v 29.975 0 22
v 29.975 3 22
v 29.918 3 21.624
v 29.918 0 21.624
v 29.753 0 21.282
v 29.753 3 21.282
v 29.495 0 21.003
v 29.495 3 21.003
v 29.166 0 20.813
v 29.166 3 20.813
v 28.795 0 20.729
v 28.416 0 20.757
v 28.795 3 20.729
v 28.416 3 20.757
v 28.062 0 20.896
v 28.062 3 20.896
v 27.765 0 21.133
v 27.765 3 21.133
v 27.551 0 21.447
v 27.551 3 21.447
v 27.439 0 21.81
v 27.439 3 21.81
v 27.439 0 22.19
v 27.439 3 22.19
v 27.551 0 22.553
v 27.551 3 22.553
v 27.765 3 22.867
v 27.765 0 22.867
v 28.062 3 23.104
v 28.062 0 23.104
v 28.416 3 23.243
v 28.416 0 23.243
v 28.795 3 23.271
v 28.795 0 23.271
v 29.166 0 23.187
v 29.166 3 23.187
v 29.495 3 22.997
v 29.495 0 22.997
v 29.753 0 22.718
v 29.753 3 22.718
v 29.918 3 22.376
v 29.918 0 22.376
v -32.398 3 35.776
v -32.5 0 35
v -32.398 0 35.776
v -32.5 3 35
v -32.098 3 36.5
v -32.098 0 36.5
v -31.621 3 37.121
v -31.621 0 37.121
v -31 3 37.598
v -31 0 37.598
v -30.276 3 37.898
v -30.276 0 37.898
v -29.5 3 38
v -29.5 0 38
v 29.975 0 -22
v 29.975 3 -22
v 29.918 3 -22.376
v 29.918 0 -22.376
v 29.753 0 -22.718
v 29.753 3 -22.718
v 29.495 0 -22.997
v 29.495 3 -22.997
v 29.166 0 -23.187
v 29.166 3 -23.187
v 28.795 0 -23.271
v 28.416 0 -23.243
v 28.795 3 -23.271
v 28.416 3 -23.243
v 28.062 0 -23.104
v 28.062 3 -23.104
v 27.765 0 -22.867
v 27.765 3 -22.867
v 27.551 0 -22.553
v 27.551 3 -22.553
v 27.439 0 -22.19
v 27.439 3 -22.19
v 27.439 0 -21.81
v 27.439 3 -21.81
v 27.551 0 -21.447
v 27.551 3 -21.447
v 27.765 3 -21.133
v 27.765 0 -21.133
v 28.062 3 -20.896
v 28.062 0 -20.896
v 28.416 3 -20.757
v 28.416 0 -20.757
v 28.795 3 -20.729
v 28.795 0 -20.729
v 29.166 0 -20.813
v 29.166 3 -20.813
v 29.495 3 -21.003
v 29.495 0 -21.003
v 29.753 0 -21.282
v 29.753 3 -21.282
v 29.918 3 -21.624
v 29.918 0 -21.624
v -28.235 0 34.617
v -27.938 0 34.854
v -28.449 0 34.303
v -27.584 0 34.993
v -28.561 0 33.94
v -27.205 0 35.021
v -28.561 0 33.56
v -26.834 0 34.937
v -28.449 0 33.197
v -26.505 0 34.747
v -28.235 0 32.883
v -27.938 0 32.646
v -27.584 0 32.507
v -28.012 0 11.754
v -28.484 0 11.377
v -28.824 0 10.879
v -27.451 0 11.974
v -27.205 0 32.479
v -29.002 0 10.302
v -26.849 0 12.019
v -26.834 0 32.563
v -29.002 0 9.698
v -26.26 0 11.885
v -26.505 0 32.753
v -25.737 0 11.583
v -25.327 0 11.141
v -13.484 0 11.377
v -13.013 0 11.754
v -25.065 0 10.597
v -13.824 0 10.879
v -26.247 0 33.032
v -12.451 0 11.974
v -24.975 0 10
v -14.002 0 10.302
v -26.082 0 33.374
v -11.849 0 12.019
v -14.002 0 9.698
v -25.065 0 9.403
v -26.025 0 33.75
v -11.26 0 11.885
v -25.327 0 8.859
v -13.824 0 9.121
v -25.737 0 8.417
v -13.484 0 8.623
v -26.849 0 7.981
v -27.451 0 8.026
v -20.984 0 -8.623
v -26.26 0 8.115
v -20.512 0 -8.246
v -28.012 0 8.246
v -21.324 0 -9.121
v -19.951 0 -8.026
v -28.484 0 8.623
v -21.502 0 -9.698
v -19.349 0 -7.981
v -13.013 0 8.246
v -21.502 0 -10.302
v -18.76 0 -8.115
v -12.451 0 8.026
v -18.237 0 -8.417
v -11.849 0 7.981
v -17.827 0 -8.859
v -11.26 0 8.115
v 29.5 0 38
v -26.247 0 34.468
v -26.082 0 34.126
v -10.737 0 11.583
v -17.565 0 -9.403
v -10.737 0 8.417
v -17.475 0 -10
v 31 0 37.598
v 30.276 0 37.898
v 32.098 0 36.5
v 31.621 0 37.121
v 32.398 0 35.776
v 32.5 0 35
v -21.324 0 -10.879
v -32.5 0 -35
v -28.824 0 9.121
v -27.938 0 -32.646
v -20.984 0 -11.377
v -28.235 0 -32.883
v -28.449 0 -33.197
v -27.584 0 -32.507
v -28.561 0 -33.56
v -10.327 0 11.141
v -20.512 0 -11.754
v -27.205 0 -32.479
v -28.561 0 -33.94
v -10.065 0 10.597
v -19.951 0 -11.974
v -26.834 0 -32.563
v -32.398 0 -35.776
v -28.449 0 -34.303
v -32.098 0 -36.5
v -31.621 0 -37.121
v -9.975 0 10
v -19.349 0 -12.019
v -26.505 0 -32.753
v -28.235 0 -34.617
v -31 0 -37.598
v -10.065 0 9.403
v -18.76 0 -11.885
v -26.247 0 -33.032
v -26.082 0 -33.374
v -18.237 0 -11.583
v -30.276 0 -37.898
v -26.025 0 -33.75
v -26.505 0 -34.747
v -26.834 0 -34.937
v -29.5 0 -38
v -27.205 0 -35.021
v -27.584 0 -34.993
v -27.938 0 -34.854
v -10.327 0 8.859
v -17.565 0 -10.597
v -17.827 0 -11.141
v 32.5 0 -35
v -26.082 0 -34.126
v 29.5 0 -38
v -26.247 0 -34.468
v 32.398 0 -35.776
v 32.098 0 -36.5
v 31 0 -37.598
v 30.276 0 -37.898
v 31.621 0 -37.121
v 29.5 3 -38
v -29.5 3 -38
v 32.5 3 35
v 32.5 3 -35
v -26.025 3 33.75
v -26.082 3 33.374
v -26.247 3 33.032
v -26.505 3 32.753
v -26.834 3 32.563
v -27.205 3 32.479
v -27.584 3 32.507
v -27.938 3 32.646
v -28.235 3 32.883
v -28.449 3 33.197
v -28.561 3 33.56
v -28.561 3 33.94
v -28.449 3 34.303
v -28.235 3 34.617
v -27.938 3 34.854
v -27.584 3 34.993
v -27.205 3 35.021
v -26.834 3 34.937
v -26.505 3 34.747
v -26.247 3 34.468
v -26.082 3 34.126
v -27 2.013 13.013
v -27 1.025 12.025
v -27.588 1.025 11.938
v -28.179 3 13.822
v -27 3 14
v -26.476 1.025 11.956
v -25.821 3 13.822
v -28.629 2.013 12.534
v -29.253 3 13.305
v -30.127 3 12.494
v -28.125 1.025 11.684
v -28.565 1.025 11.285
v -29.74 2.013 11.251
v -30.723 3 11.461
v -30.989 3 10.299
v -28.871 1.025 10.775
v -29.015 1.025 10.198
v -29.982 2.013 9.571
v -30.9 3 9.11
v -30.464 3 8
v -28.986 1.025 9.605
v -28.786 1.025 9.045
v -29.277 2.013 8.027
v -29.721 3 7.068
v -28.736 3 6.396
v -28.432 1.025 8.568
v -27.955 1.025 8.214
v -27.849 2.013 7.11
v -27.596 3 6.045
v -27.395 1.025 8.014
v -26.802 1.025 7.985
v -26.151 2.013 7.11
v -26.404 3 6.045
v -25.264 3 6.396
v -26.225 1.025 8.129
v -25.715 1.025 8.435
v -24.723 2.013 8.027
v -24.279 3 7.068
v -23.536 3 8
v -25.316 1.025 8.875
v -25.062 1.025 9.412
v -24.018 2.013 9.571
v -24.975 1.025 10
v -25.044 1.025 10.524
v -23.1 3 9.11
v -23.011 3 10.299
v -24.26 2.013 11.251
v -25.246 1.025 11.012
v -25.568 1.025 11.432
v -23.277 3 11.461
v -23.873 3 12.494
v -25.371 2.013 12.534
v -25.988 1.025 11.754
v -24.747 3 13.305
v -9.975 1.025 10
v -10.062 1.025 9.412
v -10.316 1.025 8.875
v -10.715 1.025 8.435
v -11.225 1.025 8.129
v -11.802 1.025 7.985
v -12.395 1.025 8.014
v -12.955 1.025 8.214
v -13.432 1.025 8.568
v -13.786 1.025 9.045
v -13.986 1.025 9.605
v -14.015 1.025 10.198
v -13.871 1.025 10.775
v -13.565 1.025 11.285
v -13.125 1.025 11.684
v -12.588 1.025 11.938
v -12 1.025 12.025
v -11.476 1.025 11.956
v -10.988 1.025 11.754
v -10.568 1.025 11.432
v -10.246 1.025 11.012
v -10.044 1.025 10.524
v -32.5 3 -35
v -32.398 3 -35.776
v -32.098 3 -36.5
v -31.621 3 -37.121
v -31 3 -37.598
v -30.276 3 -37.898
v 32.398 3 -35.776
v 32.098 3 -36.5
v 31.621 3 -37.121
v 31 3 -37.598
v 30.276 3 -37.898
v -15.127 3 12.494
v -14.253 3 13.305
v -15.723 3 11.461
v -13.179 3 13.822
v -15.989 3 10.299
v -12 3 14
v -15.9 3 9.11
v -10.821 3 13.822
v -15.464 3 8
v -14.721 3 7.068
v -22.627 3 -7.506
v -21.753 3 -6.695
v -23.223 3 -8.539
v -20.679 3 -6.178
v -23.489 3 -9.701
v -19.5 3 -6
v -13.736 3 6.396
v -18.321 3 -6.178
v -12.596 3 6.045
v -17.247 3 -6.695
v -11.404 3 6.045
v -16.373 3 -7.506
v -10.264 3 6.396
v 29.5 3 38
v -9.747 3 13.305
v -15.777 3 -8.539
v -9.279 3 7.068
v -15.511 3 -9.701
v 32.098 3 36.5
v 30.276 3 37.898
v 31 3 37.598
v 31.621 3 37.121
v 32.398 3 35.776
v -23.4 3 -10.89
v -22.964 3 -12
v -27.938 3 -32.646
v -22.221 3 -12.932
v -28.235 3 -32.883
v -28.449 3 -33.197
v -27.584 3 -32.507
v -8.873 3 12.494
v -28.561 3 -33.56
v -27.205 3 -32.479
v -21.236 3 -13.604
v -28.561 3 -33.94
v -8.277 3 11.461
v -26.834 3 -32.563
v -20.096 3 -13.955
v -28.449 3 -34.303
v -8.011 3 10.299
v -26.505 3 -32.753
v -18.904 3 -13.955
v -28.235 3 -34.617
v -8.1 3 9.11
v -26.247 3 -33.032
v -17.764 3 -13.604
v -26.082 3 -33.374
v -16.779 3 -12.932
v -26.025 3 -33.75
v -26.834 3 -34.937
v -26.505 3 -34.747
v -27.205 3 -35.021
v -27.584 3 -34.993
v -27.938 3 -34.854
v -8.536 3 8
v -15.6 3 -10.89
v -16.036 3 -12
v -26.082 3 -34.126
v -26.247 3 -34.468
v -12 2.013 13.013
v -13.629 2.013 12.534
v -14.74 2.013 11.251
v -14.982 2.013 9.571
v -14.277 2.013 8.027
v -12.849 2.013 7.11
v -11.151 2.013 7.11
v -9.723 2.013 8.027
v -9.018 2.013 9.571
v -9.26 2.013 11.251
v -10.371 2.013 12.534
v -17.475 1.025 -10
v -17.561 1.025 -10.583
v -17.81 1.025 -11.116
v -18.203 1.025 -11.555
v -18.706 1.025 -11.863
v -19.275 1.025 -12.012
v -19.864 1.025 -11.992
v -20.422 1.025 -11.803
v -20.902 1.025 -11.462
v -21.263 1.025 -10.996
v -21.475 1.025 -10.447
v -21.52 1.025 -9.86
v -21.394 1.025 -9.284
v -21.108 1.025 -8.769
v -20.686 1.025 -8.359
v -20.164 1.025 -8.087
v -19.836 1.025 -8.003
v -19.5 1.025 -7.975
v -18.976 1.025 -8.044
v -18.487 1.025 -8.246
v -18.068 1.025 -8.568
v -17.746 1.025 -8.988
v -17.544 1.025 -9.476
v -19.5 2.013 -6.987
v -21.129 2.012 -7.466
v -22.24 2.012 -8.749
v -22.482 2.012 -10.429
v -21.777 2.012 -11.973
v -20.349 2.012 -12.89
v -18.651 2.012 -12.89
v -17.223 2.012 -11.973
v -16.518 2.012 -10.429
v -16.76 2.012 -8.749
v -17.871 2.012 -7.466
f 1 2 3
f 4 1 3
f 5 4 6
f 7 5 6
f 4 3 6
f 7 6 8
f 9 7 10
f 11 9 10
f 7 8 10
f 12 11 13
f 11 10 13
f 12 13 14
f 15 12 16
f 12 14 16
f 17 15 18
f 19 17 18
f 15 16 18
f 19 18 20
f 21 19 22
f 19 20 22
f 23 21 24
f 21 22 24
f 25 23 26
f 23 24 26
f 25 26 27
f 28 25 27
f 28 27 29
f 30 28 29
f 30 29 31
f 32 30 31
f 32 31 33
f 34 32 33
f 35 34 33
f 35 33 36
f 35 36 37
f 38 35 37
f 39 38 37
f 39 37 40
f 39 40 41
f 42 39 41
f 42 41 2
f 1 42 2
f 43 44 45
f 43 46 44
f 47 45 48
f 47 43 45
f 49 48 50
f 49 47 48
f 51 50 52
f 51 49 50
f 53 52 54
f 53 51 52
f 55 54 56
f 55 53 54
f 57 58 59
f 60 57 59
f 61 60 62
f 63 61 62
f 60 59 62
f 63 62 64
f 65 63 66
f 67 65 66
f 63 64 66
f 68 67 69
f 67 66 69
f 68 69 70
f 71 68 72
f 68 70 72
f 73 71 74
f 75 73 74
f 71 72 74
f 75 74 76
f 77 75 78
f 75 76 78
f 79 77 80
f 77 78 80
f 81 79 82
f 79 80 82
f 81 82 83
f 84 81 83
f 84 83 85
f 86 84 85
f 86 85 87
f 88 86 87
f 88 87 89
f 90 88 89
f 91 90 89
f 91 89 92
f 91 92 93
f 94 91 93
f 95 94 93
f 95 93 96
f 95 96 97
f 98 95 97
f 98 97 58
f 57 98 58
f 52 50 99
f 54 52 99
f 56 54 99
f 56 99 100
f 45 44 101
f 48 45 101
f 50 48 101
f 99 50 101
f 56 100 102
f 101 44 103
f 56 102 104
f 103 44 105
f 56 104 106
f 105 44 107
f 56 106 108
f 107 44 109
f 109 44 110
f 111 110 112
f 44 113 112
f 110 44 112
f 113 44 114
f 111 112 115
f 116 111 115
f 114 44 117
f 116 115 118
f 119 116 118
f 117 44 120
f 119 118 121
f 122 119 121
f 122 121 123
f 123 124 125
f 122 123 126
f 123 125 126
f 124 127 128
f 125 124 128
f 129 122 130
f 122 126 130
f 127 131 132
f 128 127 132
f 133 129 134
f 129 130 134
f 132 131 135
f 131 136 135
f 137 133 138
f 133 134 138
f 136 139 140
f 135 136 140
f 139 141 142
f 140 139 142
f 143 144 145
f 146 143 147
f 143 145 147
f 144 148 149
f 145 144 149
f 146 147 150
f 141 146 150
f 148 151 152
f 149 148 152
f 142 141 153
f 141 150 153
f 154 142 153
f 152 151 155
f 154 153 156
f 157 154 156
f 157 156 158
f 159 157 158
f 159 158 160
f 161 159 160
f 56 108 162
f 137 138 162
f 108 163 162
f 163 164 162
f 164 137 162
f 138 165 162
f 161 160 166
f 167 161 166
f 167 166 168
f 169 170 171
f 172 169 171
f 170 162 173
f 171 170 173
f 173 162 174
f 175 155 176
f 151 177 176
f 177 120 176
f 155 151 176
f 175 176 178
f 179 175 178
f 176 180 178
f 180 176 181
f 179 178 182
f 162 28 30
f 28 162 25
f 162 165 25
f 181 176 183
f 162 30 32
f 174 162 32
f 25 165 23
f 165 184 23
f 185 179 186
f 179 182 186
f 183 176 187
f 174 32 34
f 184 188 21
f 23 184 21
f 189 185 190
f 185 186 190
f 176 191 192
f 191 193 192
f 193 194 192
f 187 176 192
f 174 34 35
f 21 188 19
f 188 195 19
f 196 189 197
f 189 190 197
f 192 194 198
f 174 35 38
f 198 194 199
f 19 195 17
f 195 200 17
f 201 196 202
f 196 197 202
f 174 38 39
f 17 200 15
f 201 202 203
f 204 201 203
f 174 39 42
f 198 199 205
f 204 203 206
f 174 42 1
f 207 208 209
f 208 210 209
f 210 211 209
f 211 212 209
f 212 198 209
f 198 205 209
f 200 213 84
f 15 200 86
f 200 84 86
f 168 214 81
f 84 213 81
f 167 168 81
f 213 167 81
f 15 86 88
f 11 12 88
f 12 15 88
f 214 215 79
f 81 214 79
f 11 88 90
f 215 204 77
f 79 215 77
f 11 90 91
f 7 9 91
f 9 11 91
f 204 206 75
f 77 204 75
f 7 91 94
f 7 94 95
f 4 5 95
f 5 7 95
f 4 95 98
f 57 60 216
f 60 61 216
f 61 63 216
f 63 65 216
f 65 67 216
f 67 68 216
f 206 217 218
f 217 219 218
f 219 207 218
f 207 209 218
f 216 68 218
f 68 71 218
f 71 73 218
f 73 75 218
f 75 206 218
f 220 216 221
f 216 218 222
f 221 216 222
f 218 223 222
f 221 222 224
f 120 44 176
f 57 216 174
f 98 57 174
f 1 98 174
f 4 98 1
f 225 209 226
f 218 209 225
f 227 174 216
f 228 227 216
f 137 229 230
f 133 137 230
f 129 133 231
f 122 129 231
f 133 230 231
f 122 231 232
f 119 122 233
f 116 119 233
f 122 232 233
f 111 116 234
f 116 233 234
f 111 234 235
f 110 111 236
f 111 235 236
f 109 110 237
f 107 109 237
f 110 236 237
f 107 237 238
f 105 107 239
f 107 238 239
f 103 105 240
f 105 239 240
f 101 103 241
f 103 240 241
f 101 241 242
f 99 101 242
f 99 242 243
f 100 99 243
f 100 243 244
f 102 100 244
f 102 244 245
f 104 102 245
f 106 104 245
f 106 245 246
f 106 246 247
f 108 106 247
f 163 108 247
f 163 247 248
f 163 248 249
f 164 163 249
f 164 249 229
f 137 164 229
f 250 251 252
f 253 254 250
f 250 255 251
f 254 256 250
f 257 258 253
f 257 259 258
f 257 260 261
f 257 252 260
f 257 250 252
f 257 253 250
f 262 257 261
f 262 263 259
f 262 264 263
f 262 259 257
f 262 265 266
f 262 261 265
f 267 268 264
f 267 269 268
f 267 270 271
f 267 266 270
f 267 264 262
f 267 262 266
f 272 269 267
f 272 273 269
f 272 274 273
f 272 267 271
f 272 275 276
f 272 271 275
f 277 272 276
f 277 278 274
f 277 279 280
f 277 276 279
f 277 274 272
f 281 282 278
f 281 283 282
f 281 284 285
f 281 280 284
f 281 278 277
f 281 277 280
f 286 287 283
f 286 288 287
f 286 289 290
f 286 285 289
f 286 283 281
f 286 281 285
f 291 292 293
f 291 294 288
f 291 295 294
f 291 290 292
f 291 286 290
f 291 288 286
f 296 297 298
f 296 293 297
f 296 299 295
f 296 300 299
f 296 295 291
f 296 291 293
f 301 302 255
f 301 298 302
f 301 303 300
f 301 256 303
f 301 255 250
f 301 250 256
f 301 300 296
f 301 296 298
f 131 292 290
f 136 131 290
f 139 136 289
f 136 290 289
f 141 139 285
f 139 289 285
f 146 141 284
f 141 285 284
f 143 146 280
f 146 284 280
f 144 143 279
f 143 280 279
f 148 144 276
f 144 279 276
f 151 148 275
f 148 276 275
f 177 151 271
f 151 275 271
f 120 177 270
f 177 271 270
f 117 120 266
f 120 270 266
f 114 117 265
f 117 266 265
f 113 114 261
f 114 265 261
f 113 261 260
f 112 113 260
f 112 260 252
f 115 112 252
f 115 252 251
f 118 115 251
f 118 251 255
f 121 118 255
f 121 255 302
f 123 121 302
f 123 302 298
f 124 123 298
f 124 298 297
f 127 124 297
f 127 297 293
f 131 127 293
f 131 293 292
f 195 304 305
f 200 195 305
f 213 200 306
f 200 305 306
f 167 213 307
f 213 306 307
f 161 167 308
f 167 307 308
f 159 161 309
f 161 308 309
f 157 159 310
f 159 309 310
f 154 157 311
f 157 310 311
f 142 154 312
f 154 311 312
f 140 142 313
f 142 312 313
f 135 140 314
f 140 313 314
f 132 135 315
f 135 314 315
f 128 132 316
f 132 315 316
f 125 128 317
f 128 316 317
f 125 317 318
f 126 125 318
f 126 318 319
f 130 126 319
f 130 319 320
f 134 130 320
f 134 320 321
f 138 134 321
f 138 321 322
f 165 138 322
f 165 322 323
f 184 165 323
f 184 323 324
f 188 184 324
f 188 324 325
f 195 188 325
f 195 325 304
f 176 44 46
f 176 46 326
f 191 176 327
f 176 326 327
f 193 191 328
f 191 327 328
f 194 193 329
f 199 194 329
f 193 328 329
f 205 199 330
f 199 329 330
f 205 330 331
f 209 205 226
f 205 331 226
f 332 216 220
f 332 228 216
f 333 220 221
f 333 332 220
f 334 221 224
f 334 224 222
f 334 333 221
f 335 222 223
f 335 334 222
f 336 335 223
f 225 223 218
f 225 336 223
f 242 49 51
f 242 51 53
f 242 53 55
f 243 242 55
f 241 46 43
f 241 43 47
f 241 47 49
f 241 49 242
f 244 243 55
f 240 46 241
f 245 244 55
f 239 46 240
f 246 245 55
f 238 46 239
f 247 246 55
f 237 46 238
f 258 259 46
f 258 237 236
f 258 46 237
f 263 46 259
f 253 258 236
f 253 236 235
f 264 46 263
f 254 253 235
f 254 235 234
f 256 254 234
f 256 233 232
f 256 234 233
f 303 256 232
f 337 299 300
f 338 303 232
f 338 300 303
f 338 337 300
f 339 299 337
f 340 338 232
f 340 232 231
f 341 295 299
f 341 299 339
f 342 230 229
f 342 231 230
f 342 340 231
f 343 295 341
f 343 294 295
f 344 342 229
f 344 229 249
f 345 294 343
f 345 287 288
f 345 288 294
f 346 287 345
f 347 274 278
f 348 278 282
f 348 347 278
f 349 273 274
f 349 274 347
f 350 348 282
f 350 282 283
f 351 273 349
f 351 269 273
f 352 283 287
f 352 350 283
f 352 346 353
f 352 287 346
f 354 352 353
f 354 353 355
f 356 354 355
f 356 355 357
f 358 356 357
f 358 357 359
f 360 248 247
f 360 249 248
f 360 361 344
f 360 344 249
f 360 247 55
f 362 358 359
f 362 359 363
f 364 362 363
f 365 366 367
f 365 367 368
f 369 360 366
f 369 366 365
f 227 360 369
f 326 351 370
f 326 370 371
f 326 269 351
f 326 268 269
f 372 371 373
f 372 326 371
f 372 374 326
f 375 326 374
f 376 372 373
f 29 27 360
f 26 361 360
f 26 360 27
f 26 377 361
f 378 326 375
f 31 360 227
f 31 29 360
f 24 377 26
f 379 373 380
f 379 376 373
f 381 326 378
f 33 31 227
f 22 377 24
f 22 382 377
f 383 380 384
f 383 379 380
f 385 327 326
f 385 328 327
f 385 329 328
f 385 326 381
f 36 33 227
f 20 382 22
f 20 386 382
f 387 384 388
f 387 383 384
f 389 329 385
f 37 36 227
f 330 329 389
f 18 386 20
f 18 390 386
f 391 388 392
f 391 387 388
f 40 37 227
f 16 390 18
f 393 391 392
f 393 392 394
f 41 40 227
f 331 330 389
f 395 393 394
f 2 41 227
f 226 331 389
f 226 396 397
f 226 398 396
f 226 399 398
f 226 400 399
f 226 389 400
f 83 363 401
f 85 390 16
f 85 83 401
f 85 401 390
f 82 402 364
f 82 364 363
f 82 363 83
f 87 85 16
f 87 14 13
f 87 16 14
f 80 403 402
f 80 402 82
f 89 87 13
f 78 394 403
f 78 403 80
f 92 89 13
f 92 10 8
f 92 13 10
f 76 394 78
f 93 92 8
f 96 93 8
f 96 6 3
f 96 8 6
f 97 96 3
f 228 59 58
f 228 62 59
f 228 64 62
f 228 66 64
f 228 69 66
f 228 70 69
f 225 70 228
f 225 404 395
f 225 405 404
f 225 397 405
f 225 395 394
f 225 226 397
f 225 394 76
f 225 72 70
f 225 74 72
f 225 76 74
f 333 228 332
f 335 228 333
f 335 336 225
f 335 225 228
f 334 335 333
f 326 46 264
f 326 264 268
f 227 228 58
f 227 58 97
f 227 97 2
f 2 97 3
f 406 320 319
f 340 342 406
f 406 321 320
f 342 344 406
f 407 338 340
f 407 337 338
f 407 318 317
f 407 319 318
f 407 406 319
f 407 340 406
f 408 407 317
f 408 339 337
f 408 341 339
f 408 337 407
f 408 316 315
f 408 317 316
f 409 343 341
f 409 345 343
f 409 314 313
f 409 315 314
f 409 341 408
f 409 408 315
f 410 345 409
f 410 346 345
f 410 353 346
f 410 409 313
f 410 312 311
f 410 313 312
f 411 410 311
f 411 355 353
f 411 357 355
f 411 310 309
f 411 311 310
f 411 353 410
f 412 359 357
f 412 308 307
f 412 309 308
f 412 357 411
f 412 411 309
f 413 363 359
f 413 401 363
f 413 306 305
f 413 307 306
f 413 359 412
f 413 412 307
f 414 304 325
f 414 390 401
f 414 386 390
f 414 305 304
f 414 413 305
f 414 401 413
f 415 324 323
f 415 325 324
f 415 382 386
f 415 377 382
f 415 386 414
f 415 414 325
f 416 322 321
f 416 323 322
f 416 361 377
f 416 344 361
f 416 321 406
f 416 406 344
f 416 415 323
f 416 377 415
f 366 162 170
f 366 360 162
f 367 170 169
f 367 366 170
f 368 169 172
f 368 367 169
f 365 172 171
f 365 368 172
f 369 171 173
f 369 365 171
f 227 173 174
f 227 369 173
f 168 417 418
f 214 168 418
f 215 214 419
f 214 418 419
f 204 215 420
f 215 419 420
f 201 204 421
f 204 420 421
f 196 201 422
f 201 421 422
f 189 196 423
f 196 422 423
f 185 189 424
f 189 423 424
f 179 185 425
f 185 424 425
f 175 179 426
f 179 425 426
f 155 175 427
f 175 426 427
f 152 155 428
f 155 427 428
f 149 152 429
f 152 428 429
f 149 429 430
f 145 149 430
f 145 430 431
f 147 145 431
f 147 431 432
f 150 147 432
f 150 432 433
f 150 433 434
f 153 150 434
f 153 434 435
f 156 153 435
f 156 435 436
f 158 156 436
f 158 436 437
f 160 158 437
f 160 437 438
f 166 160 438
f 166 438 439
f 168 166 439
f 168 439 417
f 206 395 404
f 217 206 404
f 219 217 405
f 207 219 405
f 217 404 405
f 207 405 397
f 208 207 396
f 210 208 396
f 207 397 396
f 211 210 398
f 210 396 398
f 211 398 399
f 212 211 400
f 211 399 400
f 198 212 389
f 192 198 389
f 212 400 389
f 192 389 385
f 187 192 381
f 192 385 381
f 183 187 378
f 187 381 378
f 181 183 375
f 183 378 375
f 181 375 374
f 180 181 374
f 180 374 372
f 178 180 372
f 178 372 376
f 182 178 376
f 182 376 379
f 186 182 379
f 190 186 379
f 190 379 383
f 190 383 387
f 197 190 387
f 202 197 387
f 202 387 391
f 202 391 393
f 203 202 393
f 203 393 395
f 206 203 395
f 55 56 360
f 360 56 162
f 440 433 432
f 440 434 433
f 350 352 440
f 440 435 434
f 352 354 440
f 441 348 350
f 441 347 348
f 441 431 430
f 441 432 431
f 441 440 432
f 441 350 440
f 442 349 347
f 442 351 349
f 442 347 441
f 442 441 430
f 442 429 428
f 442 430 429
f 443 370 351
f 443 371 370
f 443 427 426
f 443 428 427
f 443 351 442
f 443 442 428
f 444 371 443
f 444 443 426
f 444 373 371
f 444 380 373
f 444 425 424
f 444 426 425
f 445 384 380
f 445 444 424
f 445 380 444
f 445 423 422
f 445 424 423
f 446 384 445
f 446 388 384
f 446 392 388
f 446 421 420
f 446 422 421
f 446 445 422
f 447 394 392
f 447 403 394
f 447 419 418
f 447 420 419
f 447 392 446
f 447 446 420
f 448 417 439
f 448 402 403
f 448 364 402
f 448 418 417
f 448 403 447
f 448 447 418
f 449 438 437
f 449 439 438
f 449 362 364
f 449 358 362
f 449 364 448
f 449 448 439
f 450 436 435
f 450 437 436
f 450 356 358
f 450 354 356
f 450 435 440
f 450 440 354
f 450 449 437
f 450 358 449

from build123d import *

# Parameters (mm, degrees)
SKETCH_1_W               = 65
SKETCH_1_H               = 76
EXTRUDE_1_DEPTH          = 3
FILLET_1_R               = 3
SKETCH_3_R               = 1.275
CUT_EXTRUDE_1_DEPTH      = 1
CUT_EXTRUDE_1_DEPTH_BACK = 4
SKETCH_6_R               = 2.025
CUT_EXTRUDE_3_DEPTH      = 10
HOLE_WIZARD_1_AT_2_COUNT = 2
HOLE_WIZARD_1_AT_2_PITCH = 15
HOLE_WIZARD_1_AT_3_COUNT = 2
HOLE_WIZARD_1_AT_3_PITCH = 21.360009363


with BuildPart() as part:
    # 草图1 → 凸台-拉伸1 (new body)
    with BuildSketch(Plane(origin=(0, 0, 0), x_dir=(1, 0, 0), z_dir=(0, 1, 0))):
        Rectangle(SKETCH_1_W, SKETCH_1_H)
    extrude(amount=EXTRUDE_1_DEPTH)

    # 圆角1
    fillet_1_edges = [part.edges().sort_by_distance(p)[0] for p in [
        (32.5, 1.5, 38),
        (-32.5, 1.5, 38),
        (-32.5, 1.5, -38),
        (32.5, 1.5, -38),
    ]]
    fillet(fillet_1_edges, radius=FILLET_1_R)

    # 草图3 → 切除-拉伸1 (cut, two sides)
    with BuildSketch(Plane(origin=(0, 3, 0), x_dir=(1, 0, 0), z_dir=(0, 1, 0))) as cut_extrude_1_sk:
        with Locations((28.7, -22)):
            Circle(SKETCH_3_R)
        with Locations((28.7, 22)):
            Circle(SKETCH_3_R)
        with Locations((-27.3, 33.75)):
            Circle(SKETCH_3_R)
        with Locations((-27.3, -33.75)):
            Circle(SKETCH_3_R)
    extrude(amount=CUT_EXTRUDE_1_DEPTH, mode=Mode.SUBTRACT)
    extrude(cut_extrude_1_sk.sketch, amount=-CUT_EXTRUDE_1_DEPTH_BACK, mode=Mode.SUBTRACT)

    # 草图6 → 切除-拉伸3 (cut)
    with BuildSketch(Plane(origin=(0, 3, 0), x_dir=(1, 0, 0), z_dir=(0, 1, 0))):
        with Locations((-27, -10)):
            Circle(SKETCH_6_R)
        with Locations((-12, -10)):
            Circle(SKETCH_6_R)
        with Locations((-19.5, 10)):
            Circle(SKETCH_6_R)
    extrude(amount=-CUT_EXTRUDE_3_DEPTH, mode=Mode.SUBTRACT)

    # 草图7 → 孔1 (revolve, cut)
    with BuildSketch(Plane(origin=(-12, 3, 10), x_dir=(0, 0, 1), z_dir=(1, 0, 0))):
        Polygon((0, 0), (0, 3), (2, 3), (2, 2), (4, 0), align=None)
    hole_wizard_1 = revolve(axis=Axis((-12, 9.445314094, 10), (0, -1, 0)), mode=Mode.SUBTRACT)

    # 孔1 at 2: 孔1 ×2
    with Locations(*[(-i * HOLE_WIZARD_1_AT_2_PITCH, 0, 0) for i in range(1, HOLE_WIZARD_1_AT_2_COUNT)]):
        add(hole_wizard_1, mode=Mode.SUBTRACT)

    # 孔1 at 3: 孔1 ×2
    with Locations(*[Vector(-0.351123442, 0, -0.936329178) * (i * HOLE_WIZARD_1_AT_3_PITCH) for i in range(1, HOLE_WIZARD_1_AT_3_COUNT)]):
        add(hole_wizard_1, mode=Mode.SUBTRACT)


solid = part.part
